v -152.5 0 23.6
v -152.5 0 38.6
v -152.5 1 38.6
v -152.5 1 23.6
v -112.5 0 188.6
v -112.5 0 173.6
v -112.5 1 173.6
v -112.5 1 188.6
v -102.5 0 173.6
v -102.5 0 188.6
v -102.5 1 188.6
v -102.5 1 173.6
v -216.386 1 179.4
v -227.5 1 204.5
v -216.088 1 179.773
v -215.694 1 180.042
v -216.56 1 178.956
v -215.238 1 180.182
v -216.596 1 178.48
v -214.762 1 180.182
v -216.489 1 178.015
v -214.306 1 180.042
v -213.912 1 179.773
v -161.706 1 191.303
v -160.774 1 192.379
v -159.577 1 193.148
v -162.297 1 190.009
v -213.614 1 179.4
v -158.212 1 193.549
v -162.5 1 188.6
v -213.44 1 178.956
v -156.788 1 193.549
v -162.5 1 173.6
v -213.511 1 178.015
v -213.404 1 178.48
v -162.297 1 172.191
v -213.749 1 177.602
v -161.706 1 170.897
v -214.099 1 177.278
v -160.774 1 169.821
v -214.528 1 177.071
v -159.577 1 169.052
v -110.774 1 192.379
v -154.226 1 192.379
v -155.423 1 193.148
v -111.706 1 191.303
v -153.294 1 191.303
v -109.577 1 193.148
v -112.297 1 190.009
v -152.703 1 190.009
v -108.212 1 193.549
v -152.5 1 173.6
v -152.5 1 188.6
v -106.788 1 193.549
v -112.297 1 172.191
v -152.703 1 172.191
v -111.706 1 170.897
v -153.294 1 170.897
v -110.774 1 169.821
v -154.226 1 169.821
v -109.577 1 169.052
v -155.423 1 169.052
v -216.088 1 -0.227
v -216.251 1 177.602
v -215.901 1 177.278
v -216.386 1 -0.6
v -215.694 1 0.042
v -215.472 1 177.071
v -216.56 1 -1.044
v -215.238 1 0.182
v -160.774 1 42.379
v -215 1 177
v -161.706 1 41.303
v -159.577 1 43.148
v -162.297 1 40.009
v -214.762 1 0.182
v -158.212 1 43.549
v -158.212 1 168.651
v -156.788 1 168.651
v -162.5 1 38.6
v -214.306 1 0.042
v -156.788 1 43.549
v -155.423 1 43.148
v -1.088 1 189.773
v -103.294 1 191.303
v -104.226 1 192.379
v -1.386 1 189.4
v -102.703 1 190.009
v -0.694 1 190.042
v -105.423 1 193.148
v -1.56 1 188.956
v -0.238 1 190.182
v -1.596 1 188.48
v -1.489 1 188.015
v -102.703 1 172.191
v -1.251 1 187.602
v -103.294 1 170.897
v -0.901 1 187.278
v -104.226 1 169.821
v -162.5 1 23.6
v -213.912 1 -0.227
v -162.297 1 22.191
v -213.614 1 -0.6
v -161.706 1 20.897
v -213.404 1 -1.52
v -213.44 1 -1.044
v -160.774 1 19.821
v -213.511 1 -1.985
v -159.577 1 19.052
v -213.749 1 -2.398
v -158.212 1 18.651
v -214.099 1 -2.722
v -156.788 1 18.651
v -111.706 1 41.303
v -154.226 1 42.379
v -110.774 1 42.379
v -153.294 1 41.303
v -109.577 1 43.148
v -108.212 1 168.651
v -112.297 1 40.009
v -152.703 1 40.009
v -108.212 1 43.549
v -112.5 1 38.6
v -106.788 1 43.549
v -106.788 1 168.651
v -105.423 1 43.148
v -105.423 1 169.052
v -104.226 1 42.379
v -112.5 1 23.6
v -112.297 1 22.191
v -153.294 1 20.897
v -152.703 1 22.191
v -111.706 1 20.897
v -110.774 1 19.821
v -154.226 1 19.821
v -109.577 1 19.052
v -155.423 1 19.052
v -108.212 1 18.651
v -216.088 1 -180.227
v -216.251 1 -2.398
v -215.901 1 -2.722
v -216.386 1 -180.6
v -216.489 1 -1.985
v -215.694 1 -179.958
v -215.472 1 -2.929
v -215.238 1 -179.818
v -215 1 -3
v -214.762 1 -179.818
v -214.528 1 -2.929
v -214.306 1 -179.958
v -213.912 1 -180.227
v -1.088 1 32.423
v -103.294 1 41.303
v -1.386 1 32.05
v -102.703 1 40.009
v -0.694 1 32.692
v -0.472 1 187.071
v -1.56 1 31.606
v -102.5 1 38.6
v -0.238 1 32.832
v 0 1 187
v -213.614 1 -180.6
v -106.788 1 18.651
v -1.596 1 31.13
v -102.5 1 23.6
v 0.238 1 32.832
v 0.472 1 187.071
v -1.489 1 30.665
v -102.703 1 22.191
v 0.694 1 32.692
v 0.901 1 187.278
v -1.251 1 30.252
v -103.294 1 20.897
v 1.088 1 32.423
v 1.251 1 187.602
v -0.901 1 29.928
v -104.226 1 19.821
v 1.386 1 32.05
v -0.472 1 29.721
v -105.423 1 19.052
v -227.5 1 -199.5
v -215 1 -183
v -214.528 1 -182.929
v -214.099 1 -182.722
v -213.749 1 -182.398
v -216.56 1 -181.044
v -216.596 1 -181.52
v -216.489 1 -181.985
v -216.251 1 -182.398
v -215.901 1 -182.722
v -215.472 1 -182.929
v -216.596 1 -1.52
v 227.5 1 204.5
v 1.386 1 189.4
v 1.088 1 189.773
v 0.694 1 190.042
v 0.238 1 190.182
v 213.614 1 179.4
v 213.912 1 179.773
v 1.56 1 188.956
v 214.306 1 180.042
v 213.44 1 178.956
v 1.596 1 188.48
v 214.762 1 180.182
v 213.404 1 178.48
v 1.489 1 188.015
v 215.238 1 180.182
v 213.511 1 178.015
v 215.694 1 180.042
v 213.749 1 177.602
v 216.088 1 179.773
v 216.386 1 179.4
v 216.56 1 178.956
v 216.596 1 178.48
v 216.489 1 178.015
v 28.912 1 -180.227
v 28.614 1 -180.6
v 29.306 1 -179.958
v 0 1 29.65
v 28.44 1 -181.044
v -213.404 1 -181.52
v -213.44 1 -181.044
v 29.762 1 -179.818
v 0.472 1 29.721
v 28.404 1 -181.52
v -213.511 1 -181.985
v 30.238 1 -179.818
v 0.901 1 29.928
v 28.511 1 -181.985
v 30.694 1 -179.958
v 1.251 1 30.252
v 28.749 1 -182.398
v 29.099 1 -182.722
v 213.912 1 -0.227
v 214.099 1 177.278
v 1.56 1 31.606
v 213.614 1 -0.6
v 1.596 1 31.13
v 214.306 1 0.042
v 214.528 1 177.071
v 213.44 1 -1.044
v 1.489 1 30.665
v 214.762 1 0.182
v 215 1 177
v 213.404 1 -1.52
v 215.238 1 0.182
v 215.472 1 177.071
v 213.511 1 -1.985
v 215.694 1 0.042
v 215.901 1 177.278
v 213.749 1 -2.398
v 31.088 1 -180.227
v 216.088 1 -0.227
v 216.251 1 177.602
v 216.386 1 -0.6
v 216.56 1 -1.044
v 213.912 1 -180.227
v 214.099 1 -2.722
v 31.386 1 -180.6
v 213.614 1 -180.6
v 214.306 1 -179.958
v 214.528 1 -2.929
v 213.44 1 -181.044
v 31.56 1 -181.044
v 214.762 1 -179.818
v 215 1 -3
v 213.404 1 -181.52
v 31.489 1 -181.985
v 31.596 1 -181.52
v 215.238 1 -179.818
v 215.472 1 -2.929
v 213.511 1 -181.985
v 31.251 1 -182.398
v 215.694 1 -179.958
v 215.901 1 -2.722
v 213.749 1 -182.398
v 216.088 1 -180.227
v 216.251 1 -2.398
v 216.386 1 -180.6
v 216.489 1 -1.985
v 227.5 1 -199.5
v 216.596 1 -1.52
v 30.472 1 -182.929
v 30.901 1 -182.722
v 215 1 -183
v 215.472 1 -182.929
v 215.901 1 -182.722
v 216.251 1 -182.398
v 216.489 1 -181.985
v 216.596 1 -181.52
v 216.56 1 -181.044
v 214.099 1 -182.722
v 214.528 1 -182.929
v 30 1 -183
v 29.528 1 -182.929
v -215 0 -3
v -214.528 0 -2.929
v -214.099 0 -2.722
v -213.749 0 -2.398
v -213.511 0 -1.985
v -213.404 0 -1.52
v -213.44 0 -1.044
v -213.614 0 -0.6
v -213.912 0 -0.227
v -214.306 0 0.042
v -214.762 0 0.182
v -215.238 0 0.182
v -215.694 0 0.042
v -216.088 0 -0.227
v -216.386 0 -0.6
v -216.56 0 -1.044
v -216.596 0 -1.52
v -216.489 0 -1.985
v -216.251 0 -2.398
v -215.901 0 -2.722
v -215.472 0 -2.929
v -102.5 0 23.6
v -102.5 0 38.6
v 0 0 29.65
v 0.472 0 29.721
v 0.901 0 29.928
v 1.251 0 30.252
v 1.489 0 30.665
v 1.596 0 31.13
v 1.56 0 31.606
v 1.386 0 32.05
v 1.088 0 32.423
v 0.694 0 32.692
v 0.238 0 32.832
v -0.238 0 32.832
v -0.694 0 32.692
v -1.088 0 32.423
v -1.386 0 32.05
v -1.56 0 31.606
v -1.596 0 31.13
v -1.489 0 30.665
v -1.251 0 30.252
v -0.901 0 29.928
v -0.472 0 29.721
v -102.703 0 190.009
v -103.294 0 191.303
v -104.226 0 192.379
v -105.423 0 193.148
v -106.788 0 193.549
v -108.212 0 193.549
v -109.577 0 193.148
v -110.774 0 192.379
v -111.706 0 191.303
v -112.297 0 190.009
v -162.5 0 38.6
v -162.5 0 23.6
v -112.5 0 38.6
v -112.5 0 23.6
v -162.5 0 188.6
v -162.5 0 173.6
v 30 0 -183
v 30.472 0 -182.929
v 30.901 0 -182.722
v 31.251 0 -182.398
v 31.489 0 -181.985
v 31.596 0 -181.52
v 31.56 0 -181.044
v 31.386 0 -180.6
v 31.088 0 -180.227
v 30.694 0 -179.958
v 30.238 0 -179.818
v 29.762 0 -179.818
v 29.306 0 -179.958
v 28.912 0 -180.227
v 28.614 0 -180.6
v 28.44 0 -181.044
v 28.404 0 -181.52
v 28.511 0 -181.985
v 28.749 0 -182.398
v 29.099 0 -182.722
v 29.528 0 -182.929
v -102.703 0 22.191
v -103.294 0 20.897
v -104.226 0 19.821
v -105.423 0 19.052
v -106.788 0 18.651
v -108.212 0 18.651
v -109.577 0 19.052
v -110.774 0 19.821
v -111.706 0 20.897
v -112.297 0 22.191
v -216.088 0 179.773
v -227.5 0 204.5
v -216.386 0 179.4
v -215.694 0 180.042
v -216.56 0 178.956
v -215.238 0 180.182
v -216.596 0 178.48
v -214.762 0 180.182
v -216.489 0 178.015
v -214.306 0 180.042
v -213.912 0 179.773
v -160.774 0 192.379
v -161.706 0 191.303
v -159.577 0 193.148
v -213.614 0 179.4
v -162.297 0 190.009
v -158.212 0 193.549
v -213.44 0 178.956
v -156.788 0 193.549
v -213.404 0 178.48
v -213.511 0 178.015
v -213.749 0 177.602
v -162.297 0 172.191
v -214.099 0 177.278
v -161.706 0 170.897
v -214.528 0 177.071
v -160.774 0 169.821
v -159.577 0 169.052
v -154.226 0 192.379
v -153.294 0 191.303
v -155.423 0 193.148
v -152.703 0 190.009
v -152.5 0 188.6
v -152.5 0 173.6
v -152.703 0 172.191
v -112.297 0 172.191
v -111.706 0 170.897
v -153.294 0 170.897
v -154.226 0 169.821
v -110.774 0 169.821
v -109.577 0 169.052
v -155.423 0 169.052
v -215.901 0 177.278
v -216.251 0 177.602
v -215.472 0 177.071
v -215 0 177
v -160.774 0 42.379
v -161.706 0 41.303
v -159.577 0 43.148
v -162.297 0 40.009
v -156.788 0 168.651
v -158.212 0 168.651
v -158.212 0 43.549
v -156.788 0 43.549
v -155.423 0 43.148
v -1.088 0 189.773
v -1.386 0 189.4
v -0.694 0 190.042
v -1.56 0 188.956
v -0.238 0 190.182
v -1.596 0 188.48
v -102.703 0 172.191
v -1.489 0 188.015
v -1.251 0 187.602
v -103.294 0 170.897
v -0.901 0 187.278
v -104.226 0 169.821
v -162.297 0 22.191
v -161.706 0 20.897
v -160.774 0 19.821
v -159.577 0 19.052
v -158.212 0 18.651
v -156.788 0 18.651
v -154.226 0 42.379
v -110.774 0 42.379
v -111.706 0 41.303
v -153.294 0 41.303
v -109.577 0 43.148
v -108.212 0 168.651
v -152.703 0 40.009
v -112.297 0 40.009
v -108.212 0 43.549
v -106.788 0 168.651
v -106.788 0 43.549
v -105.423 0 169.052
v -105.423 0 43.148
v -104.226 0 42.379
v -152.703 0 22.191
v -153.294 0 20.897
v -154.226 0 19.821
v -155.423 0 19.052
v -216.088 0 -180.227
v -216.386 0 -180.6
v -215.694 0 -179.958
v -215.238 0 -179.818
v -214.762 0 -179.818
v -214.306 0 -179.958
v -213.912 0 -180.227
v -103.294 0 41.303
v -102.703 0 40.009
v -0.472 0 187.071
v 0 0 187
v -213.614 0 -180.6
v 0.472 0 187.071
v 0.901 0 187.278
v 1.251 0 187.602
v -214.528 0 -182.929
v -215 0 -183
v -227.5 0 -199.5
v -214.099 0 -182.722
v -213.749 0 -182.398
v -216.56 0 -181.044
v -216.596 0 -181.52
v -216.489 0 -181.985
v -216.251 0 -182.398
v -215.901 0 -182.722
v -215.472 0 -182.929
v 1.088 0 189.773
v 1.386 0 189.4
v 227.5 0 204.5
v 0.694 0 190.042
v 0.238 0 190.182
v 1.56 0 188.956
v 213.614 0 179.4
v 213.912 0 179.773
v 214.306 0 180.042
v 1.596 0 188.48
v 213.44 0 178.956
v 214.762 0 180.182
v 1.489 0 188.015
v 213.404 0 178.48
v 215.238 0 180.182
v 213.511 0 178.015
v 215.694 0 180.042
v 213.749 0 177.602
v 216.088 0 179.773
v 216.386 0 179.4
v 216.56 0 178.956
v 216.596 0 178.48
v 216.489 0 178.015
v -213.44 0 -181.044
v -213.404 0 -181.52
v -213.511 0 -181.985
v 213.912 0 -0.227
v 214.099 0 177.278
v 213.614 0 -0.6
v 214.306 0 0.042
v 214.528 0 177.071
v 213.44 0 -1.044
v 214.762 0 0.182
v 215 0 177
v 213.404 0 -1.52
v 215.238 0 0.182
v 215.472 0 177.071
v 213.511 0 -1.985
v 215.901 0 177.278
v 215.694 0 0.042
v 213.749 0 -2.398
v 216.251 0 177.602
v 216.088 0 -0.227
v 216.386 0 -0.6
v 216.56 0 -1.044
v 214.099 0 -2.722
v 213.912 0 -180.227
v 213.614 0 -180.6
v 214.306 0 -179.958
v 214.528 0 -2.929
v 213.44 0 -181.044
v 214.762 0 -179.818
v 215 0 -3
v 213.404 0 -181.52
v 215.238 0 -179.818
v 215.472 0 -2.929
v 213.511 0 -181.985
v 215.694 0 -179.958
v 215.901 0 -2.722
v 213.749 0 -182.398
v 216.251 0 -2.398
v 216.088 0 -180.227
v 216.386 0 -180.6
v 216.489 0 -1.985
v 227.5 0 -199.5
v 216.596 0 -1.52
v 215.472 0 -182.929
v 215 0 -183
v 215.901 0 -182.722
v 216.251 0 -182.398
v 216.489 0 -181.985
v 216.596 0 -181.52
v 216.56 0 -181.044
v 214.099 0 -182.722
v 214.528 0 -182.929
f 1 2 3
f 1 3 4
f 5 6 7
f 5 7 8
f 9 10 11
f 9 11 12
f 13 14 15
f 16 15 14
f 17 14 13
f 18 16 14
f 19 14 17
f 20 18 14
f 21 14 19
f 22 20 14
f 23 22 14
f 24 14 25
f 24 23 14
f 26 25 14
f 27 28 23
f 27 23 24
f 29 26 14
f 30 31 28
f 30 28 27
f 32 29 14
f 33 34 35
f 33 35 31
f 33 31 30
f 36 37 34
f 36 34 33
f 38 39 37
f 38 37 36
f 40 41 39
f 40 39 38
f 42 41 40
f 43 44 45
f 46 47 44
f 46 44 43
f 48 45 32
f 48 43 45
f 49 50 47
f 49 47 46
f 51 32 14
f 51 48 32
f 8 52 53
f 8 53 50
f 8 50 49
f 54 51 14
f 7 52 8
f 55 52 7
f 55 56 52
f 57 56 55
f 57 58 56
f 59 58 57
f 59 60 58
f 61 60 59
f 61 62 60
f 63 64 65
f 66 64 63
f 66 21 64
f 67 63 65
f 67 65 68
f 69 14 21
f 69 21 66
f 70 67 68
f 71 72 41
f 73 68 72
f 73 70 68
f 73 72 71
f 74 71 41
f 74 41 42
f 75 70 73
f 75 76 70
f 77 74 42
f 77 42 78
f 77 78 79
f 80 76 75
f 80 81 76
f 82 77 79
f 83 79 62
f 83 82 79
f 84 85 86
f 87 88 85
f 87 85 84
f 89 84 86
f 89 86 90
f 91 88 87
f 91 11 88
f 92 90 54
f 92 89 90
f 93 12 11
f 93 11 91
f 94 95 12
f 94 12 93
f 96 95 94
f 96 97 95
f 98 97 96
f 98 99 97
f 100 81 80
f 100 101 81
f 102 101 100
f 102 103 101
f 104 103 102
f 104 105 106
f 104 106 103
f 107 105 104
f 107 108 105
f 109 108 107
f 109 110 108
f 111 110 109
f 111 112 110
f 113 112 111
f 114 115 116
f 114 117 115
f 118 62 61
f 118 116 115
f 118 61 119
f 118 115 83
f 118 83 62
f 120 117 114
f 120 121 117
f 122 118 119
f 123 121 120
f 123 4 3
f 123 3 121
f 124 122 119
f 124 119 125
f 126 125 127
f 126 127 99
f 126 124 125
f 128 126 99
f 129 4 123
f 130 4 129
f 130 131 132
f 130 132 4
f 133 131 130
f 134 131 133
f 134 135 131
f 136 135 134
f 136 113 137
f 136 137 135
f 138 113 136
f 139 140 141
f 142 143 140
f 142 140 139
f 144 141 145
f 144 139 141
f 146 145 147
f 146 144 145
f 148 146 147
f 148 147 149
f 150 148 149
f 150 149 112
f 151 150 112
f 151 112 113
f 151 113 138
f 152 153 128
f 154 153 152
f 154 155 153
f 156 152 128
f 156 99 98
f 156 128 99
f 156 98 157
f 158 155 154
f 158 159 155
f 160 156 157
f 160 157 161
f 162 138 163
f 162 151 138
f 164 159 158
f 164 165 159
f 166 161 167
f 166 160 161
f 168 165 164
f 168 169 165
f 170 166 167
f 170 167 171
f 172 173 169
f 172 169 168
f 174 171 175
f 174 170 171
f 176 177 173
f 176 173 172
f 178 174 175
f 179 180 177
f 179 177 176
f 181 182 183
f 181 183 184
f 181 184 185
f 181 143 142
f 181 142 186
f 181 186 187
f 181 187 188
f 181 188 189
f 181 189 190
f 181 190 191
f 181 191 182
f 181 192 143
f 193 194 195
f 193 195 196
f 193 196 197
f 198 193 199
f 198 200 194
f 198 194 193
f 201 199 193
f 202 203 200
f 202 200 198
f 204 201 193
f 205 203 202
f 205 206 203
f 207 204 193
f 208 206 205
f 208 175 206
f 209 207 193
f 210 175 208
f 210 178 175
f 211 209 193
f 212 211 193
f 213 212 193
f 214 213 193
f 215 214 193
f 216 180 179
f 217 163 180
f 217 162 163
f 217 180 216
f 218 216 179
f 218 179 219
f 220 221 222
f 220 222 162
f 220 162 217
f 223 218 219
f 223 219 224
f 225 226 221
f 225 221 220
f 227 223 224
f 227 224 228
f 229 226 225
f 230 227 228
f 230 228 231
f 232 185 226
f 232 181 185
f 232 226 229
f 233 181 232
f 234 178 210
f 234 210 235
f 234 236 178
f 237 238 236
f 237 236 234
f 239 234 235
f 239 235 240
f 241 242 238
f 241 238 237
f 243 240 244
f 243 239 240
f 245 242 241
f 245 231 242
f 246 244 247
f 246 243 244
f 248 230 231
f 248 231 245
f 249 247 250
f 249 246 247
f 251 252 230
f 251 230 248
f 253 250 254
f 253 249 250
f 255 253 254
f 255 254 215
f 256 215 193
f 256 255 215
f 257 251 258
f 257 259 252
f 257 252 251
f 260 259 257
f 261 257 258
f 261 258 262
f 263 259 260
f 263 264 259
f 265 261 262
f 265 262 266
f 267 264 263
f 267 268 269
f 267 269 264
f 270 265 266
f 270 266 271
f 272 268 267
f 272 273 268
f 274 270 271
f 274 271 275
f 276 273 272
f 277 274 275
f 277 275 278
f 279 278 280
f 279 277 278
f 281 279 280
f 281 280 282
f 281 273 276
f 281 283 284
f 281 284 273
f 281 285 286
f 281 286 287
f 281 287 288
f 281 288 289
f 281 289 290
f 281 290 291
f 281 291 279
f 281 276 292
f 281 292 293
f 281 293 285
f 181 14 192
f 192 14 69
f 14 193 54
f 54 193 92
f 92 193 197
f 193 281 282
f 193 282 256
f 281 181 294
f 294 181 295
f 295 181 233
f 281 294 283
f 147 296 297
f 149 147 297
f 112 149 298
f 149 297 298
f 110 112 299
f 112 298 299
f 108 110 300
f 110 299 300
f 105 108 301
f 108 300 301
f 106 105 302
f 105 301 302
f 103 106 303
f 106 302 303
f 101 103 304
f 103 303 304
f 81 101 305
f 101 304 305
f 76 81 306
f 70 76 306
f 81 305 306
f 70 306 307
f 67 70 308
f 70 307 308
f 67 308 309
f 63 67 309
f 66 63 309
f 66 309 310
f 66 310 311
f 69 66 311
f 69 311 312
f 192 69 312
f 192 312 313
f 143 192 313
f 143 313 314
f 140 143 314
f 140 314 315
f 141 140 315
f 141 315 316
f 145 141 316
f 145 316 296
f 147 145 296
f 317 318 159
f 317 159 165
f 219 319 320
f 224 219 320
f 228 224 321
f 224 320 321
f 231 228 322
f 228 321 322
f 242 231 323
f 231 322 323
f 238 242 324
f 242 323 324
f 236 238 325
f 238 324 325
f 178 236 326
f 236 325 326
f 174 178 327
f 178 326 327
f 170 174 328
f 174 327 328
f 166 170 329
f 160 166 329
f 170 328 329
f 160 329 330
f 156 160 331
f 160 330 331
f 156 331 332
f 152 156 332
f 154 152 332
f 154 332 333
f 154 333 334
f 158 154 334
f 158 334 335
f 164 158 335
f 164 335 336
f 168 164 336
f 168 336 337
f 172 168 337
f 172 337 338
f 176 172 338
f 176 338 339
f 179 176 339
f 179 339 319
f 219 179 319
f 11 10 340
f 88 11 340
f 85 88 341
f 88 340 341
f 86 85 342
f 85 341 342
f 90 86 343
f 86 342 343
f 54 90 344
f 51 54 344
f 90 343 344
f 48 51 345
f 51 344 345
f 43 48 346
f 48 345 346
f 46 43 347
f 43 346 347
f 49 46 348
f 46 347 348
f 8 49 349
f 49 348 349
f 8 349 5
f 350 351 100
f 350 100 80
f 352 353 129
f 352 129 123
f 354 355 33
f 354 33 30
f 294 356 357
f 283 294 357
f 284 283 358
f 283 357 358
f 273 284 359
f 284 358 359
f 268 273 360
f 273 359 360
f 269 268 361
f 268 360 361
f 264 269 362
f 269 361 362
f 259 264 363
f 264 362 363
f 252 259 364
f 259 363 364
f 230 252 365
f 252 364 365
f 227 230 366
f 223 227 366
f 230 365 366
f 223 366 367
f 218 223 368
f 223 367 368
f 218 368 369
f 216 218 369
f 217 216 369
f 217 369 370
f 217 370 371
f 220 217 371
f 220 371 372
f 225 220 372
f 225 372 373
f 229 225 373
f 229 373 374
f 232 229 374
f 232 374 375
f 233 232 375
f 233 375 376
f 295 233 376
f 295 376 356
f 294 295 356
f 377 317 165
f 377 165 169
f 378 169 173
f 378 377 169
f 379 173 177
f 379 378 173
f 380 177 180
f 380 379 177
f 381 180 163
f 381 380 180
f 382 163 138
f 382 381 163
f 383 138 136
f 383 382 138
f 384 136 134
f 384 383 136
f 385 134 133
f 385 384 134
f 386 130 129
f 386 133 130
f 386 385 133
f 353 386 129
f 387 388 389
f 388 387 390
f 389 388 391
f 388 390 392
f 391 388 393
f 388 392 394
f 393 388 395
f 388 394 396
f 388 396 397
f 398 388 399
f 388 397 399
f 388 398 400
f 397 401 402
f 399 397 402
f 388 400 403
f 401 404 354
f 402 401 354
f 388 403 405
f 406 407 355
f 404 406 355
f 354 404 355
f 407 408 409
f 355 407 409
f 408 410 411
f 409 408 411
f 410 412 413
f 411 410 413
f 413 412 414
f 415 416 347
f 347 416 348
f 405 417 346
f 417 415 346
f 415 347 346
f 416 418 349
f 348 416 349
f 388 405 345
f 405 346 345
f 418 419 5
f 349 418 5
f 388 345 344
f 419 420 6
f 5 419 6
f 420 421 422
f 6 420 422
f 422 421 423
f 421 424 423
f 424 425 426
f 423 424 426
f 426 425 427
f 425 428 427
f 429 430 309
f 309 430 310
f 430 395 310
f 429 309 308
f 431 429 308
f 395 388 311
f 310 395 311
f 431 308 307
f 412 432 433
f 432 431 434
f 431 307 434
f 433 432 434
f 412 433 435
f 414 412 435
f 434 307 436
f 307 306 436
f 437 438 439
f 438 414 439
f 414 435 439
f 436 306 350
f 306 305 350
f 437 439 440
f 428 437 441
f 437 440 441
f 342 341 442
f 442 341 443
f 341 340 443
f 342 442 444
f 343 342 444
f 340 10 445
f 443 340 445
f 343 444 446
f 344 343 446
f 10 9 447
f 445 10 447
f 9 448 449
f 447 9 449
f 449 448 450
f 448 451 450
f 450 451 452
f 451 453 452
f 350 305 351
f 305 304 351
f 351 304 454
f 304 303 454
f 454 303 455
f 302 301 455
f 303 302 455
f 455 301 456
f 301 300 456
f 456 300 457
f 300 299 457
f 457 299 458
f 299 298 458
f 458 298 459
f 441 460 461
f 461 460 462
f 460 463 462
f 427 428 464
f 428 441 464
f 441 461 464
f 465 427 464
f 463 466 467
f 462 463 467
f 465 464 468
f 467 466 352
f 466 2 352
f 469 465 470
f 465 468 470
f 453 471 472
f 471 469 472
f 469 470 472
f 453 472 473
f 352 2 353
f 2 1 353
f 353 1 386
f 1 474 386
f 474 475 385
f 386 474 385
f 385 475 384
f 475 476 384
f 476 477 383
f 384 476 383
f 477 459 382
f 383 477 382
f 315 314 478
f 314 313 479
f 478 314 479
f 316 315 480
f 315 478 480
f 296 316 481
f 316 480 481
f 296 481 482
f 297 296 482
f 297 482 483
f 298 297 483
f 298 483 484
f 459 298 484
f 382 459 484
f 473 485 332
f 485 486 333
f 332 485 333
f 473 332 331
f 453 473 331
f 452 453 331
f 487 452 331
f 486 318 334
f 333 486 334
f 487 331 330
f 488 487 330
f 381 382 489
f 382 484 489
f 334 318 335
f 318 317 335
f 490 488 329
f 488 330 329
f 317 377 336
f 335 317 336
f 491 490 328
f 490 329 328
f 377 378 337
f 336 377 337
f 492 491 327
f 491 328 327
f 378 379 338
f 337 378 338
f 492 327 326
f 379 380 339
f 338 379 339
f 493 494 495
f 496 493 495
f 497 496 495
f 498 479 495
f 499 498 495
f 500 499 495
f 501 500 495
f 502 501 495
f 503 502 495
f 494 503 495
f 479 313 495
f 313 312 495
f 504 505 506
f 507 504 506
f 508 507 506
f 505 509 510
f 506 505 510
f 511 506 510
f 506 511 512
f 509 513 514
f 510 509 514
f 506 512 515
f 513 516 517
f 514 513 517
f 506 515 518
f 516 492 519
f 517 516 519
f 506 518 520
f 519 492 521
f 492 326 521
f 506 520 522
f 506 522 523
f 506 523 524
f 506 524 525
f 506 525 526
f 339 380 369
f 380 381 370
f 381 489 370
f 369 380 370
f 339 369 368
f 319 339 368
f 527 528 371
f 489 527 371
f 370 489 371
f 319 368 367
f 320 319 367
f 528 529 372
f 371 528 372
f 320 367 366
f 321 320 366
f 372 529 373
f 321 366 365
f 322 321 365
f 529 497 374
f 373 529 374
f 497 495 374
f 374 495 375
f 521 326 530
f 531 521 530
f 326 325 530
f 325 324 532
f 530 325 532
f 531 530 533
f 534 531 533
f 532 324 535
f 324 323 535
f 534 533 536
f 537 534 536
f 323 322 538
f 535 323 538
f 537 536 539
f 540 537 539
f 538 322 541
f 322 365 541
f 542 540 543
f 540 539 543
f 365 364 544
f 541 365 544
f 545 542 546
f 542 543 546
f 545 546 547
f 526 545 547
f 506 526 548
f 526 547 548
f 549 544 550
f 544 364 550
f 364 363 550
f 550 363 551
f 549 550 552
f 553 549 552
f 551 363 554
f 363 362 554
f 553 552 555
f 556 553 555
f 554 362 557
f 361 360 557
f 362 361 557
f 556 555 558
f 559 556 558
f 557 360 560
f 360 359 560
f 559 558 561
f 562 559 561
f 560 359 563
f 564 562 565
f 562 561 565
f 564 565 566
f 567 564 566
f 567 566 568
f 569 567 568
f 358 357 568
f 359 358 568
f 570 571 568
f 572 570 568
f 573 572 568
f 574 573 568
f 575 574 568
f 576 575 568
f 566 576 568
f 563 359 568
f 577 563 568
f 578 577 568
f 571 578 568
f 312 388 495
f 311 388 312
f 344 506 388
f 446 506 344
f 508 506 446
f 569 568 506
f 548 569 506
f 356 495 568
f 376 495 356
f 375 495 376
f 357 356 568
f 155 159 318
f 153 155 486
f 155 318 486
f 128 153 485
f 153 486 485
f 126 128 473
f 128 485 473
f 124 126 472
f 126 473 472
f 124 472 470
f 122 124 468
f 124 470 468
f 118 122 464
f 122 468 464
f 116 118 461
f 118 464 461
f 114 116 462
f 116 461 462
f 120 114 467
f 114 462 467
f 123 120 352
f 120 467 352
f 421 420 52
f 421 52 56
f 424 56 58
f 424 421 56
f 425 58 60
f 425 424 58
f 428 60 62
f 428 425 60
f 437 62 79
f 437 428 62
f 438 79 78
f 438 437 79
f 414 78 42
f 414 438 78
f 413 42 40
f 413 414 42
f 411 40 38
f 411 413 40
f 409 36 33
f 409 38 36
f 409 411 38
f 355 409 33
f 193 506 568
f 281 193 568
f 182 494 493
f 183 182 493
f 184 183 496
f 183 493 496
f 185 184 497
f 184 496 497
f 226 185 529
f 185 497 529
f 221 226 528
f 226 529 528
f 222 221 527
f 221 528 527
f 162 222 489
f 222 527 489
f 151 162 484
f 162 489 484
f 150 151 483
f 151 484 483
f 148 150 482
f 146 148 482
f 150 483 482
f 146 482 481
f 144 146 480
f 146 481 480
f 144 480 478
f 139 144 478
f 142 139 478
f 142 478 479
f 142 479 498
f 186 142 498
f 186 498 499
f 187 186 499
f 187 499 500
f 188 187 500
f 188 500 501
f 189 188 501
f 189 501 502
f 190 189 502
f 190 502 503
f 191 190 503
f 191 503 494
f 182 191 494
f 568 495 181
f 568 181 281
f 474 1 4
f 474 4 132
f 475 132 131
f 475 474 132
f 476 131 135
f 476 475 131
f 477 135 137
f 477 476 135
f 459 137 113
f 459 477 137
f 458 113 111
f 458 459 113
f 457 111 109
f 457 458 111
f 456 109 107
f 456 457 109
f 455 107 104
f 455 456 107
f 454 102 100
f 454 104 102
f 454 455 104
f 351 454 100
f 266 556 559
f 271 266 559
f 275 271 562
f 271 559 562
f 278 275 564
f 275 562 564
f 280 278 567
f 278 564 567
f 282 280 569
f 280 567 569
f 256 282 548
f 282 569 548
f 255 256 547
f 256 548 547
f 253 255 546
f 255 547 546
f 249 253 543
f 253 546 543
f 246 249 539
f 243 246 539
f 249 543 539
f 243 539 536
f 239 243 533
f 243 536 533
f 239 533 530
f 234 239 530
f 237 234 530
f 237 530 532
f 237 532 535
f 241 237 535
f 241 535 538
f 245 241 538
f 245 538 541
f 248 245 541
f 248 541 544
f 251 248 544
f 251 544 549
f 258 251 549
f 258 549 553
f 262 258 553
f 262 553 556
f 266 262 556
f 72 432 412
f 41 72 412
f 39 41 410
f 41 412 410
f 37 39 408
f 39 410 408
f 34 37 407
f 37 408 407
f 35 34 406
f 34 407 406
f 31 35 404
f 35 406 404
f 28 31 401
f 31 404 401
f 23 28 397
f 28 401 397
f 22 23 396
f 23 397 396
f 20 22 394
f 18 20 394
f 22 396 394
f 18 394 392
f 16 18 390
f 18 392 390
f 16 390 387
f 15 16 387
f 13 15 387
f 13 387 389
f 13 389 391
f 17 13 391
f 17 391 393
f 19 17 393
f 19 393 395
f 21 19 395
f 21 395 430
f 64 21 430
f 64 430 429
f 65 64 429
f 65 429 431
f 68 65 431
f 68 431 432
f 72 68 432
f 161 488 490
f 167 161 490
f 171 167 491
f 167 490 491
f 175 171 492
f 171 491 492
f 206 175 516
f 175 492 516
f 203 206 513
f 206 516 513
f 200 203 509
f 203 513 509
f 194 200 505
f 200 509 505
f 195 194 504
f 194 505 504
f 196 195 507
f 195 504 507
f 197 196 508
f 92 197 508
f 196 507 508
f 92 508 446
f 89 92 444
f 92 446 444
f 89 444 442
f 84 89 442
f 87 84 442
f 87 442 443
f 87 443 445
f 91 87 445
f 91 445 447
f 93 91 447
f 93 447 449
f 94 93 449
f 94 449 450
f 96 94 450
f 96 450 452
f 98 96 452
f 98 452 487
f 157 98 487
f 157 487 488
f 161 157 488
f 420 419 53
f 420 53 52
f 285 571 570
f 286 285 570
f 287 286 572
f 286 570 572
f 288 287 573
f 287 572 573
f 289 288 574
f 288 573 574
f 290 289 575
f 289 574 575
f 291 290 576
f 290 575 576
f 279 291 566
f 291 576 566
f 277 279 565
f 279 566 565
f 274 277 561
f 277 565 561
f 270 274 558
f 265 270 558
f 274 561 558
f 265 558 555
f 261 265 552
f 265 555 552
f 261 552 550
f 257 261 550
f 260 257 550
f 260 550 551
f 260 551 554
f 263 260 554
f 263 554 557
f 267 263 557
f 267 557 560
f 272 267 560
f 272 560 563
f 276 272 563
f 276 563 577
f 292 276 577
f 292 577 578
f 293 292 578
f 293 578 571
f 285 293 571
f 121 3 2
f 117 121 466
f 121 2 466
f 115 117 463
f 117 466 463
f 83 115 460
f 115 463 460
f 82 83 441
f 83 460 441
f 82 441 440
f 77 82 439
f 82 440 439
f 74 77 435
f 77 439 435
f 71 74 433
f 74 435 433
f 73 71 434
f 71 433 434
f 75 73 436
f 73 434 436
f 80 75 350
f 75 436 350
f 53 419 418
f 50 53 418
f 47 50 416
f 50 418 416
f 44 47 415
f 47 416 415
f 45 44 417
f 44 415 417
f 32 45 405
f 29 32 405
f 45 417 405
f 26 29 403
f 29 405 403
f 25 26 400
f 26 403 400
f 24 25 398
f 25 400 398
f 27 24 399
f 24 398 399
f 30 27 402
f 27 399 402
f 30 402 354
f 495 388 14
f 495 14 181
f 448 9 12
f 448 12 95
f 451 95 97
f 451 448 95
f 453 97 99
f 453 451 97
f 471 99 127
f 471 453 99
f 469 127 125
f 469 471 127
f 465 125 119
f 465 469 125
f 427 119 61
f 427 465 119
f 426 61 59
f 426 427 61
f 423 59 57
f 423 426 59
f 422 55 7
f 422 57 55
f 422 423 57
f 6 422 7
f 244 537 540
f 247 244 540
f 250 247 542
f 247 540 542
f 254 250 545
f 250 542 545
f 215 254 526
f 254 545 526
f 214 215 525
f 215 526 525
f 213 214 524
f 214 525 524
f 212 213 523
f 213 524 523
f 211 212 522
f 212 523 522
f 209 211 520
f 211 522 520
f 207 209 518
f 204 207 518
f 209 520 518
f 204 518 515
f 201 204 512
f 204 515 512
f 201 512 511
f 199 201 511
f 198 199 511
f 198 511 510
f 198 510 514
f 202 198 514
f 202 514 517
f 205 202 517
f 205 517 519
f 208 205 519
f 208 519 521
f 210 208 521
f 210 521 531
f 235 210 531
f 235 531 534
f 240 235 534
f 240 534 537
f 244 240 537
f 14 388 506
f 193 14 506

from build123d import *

# Parameters (mm, degrees)
CROQUIS1_W              = 455
CROQUIS1_H              = 409
SALIENTE_EXTRUIR1_DEPTH = 1
CORTAR_EXTRUIR1_REACH   = 307.904
CROQUIS2_R              = 1.6
CORTAR_EXTRUIR2_REACH   = 307.904
CROQUIS3_R              = 5
CORTAR_EXTRUIR3_REACH   = 307.904
CROQUIS4_R              = 1.6
MOVER_CARA1_BY          = 5
CORTAR_EXTRUIR4_DEPTH   = 10


with BuildPart() as part:
    # Croquis1 → Saliente-Extruir1 (new body)
    with BuildSketch(Plane(origin=(0, 0, 0), x_dir=(1, 0, 0), z_dir=(0, 1, 0))):
        Rectangle(CROQUIS1_W, CROQUIS1_H)
    extrude(amount=SALIENTE_EXTRUIR1_DEPTH)

    # Croquis2 → Cortar-Extruir1 (cut, up to next)
    with BuildSketch(Plane.XZ, mode=Mode.PRIVATE) as cortar_extruir1_sk1:
        with Locations(Location((-215, 178.6, 0), (0, 0, 270))):
            Circle(CROQUIS2_R)
    cortar_extruir1_tool1 = extrude(cortar_extruir1_sk1.sketch, amount=-CORTAR_EXTRUIR1_REACH, mode=Mode.PRIVATE) & part.part
    # Croquis2 → Cortar-Extruir1 (cut, up to next)
    with BuildSketch(Plane.XZ, mode=Mode.PRIVATE) as cortar_extruir1_sk2:
        with Locations(Location((-215, -181.4, 0), (0, 0, 270))):
            Circle(CROQUIS2_R)
    cortar_extruir1_tool2 = extrude(cortar_extruir1_sk2.sketch, amount=-CORTAR_EXTRUIR1_REACH, mode=Mode.PRIVATE) & part.part
    # Croquis2 → Cortar-Extruir1 (cut, up to next)
    with BuildSketch(Plane.XZ, mode=Mode.PRIVATE) as cortar_extruir1_sk3:
        with Locations(Location((215, -181.4, 0), (0, 0, 270))):
            Circle(CROQUIS2_R)
    cortar_extruir1_tool3 = extrude(cortar_extruir1_sk3.sketch, amount=-CORTAR_EXTRUIR1_REACH, mode=Mode.PRIVATE) & part.part
    # Croquis2 → Cortar-Extruir1 (cut, up to next)
    with BuildSketch(Plane.XZ, mode=Mode.PRIVATE) as cortar_extruir1_sk4:
        with Locations(Location((215, 178.6, 0), (0, 0, 270))):
            Circle(CROQUIS2_R)
    cortar_extruir1_tool4 = extrude(cortar_extruir1_sk4.sketch, amount=-CORTAR_EXTRUIR1_REACH, mode=Mode.PRIVATE) & part.part
    # Croquis2 → Cortar-Extruir1 (cut, up to next)
    with BuildSketch(Plane.XZ, mode=Mode.PRIVATE) as cortar_extruir1_sk5:
        with Locations(Location((0, 31.25, 0), (0, 0, 270))):
            Circle(CROQUIS2_R)
    cortar_extruir1_tool5 = extrude(cortar_extruir1_sk5.sketch, amount=-CORTAR_EXTRUIR1_REACH, mode=Mode.PRIVATE) & part.part
    add(cortar_extruir1_tool1.solids().sort_by_distance((-215, 0, 178.6))[0], mode=Mode.SUBTRACT)
    add(cortar_extruir1_tool2.solids().sort_by_distance((-215, 0, -181.4))[0], mode=Mode.SUBTRACT)
    add(cortar_extruir1_tool3.solids().sort_by_distance((215, 0, -181.4))[0], mode=Mode.SUBTRACT)
    add(cortar_extruir1_tool4.solids().sort_by_distance((215, 0, 178.6))[0], mode=Mode.SUBTRACT)
    add(cortar_extruir1_tool5.solids().sort_by_distance((0, 0, 31.25))[0], mode=Mode.SUBTRACT)

    # Croquis3 → Cortar-Extruir2 (cut, up to next)
    with BuildSketch(Plane.XZ, mode=Mode.PRIVATE) as cortar_extruir2_sk1:
        with Locations(Location((-157.5, 38.6, 0), (0, 0, 270))):
            Circle(CROQUIS3_R)
    cortar_extruir2_tool1 = extrude(cortar_extruir2_sk1.sketch, amount=-CORTAR_EXTRUIR2_REACH, mode=Mode.PRIVATE) & part.part
    # Croquis3 → Cortar-Extruir2 (cut, up to next)
    with BuildSketch(Plane.XZ, mode=Mode.PRIVATE) as cortar_extruir2_sk2:
        with Locations(Location((-107.5, 38.6, 0), (0, 0, 270))):
            Circle(CROQUIS3_R)
    cortar_extruir2_tool2 = extrude(cortar_extruir2_sk2.sketch, amount=-CORTAR_EXTRUIR2_REACH, mode=Mode.PRIVATE) & part.part
    # Croquis3 → Cortar-Extruir2 (cut, up to next)
    with BuildSketch(Plane.XZ, mode=Mode.PRIVATE) as cortar_extruir2_sk3:
        with Locations(Location((-107.5, 188.6, 0), (0, 0, 270))):
            Circle(CROQUIS3_R)
    cortar_extruir2_tool3 = extrude(cortar_extruir2_sk3.sketch, amount=-CORTAR_EXTRUIR2_REACH, mode=Mode.PRIVATE) & part.part
    # Croquis3 → Cortar-Extruir2 (cut, up to next)
    with BuildSketch(Plane.XZ, mode=Mode.PRIVATE) as cortar_extruir2_sk4:
        with Locations(Location((-157.5, 188.6, 0), (0, 0, 270))):
            Circle(CROQUIS3_R)
    cortar_extruir2_tool4 = extrude(cortar_extruir2_sk4.sketch, amount=-CORTAR_EXTRUIR2_REACH, mode=Mode.PRIVATE) & part.part
    add(cortar_extruir2_tool1.solids().sort_by_distance((-157.5, 0, 38.6))[0], mode=Mode.SUBTRACT)
    add(cortar_extruir2_tool2.solids().sort_by_distance((-107.5, 0, 38.6))[0], mode=Mode.SUBTRACT)
    add(cortar_extruir2_tool3.solids().sort_by_distance((-107.5, 0, 188.6))[0], mode=Mode.SUBTRACT)
    add(cortar_extruir2_tool4.solids().sort_by_distance((-157.5, 0, 188.6))[0], mode=Mode.SUBTRACT)

    # Croquis4 → Cortar-Extruir3 (cut, up to next)
    with BuildSketch(Plane.XZ, mode=Mode.PRIVATE) as cortar_extruir3_sk1:
        with Locations(Location((-215, -1.4, 0), (0, 0, 270))):
            Circle(CROQUIS4_R)
    cortar_extruir3_tool1 = extrude(cortar_extruir3_sk1.sketch, amount=-CORTAR_EXTRUIR3_REACH, mode=Mode.PRIVATE) & part.part
    # Croquis4 → Cortar-Extruir3 (cut, up to next)
    with BuildSketch(Plane.XZ, mode=Mode.PRIVATE) as cortar_extruir3_sk2:
        with Locations(Location((215, -1.4, 0), (0, 0, 270))):
            Circle(CROQUIS4_R)
    cortar_extruir3_tool2 = extrude(cortar_extruir3_sk2.sketch, amount=-CORTAR_EXTRUIR3_REACH, mode=Mode.PRIVATE) & part.part
    # Croquis4 → Cortar-Extruir3 (cut, up to next)
    with BuildSketch(Plane.XZ, mode=Mode.PRIVATE) as cortar_extruir3_sk3:
        with Locations(Location((0, 188.6, 0), (0, 0, 270))):
            Circle(CROQUIS4_R)
    cortar_extruir3_tool3 = extrude(cortar_extruir3_sk3.sketch, amount=-CORTAR_EXTRUIR3_REACH, mode=Mode.PRIVATE) & part.part
    # Croquis4 → Cortar-Extruir3 (cut, up to next)
    with BuildSketch(Plane.XZ, mode=Mode.PRIVATE) as cortar_extruir3_sk4:
        with Locations(Location((30, -181.4, 0), (0, 0, 270))):
            Circle(CROQUIS4_R)
    cortar_extruir3_tool4 = extrude(cortar_extruir3_sk4.sketch, amount=-CORTAR_EXTRUIR3_REACH, mode=Mode.PRIVATE) & part.part
    add(cortar_extruir3_tool1.solids().sort_by_distance((-215, 0, -1.4))[0], mode=Mode.SUBTRACT)
    add(cortar_extruir3_tool2.solids().sort_by_distance((215, 0, -1.4))[0], mode=Mode.SUBTRACT)
    add(cortar_extruir3_tool3.solids().sort_by_distance((0, 0, 188.6))[0], mode=Mode.SUBTRACT)
    add(cortar_extruir3_tool4.solids().sort_by_distance((30, 0, -181.4))[0], mode=Mode.SUBTRACT)

    # Mover cara1: a face moved inward by 5.0
    extrude(part.faces().sort_by_distance((0, 0.5, -204.5))[0], amount=MOVER_CARA1_BY, dir=(0, 0, 1), mode=Mode.SUBTRACT)

    # Croquis5 → Cortar-Extruir4 (cut)
    with BuildSketch(Plane.XZ):
        with BuildLine():
            Line((-162.5, 173.6), (-162.5, 188.6))
            ThreePointArc((-162.5, 188.6), (-157.5, 193.6), (-152.5, 188.6))
            Line((-152.5, 188.6), (-152.5, 173.6))
            ThreePointArc((-152.5, 173.6), (-157.5, 168.6), (-162.5, 173.6))
        make_face()
        with BuildLine():
            Line((-112.5, 173.6), (-112.5, 188.6))
            ThreePointArc((-112.5, 188.6), (-107.5, 193.6), (-102.5, 188.6))
            Line((-102.5, 188.6), (-102.5, 173.6))
            ThreePointArc((-102.5, 173.6), (-107.5, 168.6), (-112.5, 173.6))
        make_face()
        with BuildLine():
            Line((-162.5, 23.6), (-162.5, 38.6))
            ThreePointArc((-162.5, 38.6), (-157.5, 43.6), (-152.5, 38.6))
            Line((-152.5, 38.6), (-152.5, 23.6))
            ThreePointArc((-152.5, 23.6), (-157.5, 18.6), (-162.5, 23.6))
        make_face()
        with BuildLine():
            Line((-112.5, 23.6), (-112.5, 38.6))
            ThreePointArc((-112.5, 38.6), (-107.5, 43.6), (-102.5, 38.6))
            Line((-102.5, 38.6), (-102.5, 23.6))
            ThreePointArc((-102.5, 23.6), (-107.5, 18.6), (-112.5, 23.6))
        make_face()
    extrude(amount=-CORTAR_EXTRUIR4_DEPTH, mode=Mode.SUBTRACT)


solid = part.part
